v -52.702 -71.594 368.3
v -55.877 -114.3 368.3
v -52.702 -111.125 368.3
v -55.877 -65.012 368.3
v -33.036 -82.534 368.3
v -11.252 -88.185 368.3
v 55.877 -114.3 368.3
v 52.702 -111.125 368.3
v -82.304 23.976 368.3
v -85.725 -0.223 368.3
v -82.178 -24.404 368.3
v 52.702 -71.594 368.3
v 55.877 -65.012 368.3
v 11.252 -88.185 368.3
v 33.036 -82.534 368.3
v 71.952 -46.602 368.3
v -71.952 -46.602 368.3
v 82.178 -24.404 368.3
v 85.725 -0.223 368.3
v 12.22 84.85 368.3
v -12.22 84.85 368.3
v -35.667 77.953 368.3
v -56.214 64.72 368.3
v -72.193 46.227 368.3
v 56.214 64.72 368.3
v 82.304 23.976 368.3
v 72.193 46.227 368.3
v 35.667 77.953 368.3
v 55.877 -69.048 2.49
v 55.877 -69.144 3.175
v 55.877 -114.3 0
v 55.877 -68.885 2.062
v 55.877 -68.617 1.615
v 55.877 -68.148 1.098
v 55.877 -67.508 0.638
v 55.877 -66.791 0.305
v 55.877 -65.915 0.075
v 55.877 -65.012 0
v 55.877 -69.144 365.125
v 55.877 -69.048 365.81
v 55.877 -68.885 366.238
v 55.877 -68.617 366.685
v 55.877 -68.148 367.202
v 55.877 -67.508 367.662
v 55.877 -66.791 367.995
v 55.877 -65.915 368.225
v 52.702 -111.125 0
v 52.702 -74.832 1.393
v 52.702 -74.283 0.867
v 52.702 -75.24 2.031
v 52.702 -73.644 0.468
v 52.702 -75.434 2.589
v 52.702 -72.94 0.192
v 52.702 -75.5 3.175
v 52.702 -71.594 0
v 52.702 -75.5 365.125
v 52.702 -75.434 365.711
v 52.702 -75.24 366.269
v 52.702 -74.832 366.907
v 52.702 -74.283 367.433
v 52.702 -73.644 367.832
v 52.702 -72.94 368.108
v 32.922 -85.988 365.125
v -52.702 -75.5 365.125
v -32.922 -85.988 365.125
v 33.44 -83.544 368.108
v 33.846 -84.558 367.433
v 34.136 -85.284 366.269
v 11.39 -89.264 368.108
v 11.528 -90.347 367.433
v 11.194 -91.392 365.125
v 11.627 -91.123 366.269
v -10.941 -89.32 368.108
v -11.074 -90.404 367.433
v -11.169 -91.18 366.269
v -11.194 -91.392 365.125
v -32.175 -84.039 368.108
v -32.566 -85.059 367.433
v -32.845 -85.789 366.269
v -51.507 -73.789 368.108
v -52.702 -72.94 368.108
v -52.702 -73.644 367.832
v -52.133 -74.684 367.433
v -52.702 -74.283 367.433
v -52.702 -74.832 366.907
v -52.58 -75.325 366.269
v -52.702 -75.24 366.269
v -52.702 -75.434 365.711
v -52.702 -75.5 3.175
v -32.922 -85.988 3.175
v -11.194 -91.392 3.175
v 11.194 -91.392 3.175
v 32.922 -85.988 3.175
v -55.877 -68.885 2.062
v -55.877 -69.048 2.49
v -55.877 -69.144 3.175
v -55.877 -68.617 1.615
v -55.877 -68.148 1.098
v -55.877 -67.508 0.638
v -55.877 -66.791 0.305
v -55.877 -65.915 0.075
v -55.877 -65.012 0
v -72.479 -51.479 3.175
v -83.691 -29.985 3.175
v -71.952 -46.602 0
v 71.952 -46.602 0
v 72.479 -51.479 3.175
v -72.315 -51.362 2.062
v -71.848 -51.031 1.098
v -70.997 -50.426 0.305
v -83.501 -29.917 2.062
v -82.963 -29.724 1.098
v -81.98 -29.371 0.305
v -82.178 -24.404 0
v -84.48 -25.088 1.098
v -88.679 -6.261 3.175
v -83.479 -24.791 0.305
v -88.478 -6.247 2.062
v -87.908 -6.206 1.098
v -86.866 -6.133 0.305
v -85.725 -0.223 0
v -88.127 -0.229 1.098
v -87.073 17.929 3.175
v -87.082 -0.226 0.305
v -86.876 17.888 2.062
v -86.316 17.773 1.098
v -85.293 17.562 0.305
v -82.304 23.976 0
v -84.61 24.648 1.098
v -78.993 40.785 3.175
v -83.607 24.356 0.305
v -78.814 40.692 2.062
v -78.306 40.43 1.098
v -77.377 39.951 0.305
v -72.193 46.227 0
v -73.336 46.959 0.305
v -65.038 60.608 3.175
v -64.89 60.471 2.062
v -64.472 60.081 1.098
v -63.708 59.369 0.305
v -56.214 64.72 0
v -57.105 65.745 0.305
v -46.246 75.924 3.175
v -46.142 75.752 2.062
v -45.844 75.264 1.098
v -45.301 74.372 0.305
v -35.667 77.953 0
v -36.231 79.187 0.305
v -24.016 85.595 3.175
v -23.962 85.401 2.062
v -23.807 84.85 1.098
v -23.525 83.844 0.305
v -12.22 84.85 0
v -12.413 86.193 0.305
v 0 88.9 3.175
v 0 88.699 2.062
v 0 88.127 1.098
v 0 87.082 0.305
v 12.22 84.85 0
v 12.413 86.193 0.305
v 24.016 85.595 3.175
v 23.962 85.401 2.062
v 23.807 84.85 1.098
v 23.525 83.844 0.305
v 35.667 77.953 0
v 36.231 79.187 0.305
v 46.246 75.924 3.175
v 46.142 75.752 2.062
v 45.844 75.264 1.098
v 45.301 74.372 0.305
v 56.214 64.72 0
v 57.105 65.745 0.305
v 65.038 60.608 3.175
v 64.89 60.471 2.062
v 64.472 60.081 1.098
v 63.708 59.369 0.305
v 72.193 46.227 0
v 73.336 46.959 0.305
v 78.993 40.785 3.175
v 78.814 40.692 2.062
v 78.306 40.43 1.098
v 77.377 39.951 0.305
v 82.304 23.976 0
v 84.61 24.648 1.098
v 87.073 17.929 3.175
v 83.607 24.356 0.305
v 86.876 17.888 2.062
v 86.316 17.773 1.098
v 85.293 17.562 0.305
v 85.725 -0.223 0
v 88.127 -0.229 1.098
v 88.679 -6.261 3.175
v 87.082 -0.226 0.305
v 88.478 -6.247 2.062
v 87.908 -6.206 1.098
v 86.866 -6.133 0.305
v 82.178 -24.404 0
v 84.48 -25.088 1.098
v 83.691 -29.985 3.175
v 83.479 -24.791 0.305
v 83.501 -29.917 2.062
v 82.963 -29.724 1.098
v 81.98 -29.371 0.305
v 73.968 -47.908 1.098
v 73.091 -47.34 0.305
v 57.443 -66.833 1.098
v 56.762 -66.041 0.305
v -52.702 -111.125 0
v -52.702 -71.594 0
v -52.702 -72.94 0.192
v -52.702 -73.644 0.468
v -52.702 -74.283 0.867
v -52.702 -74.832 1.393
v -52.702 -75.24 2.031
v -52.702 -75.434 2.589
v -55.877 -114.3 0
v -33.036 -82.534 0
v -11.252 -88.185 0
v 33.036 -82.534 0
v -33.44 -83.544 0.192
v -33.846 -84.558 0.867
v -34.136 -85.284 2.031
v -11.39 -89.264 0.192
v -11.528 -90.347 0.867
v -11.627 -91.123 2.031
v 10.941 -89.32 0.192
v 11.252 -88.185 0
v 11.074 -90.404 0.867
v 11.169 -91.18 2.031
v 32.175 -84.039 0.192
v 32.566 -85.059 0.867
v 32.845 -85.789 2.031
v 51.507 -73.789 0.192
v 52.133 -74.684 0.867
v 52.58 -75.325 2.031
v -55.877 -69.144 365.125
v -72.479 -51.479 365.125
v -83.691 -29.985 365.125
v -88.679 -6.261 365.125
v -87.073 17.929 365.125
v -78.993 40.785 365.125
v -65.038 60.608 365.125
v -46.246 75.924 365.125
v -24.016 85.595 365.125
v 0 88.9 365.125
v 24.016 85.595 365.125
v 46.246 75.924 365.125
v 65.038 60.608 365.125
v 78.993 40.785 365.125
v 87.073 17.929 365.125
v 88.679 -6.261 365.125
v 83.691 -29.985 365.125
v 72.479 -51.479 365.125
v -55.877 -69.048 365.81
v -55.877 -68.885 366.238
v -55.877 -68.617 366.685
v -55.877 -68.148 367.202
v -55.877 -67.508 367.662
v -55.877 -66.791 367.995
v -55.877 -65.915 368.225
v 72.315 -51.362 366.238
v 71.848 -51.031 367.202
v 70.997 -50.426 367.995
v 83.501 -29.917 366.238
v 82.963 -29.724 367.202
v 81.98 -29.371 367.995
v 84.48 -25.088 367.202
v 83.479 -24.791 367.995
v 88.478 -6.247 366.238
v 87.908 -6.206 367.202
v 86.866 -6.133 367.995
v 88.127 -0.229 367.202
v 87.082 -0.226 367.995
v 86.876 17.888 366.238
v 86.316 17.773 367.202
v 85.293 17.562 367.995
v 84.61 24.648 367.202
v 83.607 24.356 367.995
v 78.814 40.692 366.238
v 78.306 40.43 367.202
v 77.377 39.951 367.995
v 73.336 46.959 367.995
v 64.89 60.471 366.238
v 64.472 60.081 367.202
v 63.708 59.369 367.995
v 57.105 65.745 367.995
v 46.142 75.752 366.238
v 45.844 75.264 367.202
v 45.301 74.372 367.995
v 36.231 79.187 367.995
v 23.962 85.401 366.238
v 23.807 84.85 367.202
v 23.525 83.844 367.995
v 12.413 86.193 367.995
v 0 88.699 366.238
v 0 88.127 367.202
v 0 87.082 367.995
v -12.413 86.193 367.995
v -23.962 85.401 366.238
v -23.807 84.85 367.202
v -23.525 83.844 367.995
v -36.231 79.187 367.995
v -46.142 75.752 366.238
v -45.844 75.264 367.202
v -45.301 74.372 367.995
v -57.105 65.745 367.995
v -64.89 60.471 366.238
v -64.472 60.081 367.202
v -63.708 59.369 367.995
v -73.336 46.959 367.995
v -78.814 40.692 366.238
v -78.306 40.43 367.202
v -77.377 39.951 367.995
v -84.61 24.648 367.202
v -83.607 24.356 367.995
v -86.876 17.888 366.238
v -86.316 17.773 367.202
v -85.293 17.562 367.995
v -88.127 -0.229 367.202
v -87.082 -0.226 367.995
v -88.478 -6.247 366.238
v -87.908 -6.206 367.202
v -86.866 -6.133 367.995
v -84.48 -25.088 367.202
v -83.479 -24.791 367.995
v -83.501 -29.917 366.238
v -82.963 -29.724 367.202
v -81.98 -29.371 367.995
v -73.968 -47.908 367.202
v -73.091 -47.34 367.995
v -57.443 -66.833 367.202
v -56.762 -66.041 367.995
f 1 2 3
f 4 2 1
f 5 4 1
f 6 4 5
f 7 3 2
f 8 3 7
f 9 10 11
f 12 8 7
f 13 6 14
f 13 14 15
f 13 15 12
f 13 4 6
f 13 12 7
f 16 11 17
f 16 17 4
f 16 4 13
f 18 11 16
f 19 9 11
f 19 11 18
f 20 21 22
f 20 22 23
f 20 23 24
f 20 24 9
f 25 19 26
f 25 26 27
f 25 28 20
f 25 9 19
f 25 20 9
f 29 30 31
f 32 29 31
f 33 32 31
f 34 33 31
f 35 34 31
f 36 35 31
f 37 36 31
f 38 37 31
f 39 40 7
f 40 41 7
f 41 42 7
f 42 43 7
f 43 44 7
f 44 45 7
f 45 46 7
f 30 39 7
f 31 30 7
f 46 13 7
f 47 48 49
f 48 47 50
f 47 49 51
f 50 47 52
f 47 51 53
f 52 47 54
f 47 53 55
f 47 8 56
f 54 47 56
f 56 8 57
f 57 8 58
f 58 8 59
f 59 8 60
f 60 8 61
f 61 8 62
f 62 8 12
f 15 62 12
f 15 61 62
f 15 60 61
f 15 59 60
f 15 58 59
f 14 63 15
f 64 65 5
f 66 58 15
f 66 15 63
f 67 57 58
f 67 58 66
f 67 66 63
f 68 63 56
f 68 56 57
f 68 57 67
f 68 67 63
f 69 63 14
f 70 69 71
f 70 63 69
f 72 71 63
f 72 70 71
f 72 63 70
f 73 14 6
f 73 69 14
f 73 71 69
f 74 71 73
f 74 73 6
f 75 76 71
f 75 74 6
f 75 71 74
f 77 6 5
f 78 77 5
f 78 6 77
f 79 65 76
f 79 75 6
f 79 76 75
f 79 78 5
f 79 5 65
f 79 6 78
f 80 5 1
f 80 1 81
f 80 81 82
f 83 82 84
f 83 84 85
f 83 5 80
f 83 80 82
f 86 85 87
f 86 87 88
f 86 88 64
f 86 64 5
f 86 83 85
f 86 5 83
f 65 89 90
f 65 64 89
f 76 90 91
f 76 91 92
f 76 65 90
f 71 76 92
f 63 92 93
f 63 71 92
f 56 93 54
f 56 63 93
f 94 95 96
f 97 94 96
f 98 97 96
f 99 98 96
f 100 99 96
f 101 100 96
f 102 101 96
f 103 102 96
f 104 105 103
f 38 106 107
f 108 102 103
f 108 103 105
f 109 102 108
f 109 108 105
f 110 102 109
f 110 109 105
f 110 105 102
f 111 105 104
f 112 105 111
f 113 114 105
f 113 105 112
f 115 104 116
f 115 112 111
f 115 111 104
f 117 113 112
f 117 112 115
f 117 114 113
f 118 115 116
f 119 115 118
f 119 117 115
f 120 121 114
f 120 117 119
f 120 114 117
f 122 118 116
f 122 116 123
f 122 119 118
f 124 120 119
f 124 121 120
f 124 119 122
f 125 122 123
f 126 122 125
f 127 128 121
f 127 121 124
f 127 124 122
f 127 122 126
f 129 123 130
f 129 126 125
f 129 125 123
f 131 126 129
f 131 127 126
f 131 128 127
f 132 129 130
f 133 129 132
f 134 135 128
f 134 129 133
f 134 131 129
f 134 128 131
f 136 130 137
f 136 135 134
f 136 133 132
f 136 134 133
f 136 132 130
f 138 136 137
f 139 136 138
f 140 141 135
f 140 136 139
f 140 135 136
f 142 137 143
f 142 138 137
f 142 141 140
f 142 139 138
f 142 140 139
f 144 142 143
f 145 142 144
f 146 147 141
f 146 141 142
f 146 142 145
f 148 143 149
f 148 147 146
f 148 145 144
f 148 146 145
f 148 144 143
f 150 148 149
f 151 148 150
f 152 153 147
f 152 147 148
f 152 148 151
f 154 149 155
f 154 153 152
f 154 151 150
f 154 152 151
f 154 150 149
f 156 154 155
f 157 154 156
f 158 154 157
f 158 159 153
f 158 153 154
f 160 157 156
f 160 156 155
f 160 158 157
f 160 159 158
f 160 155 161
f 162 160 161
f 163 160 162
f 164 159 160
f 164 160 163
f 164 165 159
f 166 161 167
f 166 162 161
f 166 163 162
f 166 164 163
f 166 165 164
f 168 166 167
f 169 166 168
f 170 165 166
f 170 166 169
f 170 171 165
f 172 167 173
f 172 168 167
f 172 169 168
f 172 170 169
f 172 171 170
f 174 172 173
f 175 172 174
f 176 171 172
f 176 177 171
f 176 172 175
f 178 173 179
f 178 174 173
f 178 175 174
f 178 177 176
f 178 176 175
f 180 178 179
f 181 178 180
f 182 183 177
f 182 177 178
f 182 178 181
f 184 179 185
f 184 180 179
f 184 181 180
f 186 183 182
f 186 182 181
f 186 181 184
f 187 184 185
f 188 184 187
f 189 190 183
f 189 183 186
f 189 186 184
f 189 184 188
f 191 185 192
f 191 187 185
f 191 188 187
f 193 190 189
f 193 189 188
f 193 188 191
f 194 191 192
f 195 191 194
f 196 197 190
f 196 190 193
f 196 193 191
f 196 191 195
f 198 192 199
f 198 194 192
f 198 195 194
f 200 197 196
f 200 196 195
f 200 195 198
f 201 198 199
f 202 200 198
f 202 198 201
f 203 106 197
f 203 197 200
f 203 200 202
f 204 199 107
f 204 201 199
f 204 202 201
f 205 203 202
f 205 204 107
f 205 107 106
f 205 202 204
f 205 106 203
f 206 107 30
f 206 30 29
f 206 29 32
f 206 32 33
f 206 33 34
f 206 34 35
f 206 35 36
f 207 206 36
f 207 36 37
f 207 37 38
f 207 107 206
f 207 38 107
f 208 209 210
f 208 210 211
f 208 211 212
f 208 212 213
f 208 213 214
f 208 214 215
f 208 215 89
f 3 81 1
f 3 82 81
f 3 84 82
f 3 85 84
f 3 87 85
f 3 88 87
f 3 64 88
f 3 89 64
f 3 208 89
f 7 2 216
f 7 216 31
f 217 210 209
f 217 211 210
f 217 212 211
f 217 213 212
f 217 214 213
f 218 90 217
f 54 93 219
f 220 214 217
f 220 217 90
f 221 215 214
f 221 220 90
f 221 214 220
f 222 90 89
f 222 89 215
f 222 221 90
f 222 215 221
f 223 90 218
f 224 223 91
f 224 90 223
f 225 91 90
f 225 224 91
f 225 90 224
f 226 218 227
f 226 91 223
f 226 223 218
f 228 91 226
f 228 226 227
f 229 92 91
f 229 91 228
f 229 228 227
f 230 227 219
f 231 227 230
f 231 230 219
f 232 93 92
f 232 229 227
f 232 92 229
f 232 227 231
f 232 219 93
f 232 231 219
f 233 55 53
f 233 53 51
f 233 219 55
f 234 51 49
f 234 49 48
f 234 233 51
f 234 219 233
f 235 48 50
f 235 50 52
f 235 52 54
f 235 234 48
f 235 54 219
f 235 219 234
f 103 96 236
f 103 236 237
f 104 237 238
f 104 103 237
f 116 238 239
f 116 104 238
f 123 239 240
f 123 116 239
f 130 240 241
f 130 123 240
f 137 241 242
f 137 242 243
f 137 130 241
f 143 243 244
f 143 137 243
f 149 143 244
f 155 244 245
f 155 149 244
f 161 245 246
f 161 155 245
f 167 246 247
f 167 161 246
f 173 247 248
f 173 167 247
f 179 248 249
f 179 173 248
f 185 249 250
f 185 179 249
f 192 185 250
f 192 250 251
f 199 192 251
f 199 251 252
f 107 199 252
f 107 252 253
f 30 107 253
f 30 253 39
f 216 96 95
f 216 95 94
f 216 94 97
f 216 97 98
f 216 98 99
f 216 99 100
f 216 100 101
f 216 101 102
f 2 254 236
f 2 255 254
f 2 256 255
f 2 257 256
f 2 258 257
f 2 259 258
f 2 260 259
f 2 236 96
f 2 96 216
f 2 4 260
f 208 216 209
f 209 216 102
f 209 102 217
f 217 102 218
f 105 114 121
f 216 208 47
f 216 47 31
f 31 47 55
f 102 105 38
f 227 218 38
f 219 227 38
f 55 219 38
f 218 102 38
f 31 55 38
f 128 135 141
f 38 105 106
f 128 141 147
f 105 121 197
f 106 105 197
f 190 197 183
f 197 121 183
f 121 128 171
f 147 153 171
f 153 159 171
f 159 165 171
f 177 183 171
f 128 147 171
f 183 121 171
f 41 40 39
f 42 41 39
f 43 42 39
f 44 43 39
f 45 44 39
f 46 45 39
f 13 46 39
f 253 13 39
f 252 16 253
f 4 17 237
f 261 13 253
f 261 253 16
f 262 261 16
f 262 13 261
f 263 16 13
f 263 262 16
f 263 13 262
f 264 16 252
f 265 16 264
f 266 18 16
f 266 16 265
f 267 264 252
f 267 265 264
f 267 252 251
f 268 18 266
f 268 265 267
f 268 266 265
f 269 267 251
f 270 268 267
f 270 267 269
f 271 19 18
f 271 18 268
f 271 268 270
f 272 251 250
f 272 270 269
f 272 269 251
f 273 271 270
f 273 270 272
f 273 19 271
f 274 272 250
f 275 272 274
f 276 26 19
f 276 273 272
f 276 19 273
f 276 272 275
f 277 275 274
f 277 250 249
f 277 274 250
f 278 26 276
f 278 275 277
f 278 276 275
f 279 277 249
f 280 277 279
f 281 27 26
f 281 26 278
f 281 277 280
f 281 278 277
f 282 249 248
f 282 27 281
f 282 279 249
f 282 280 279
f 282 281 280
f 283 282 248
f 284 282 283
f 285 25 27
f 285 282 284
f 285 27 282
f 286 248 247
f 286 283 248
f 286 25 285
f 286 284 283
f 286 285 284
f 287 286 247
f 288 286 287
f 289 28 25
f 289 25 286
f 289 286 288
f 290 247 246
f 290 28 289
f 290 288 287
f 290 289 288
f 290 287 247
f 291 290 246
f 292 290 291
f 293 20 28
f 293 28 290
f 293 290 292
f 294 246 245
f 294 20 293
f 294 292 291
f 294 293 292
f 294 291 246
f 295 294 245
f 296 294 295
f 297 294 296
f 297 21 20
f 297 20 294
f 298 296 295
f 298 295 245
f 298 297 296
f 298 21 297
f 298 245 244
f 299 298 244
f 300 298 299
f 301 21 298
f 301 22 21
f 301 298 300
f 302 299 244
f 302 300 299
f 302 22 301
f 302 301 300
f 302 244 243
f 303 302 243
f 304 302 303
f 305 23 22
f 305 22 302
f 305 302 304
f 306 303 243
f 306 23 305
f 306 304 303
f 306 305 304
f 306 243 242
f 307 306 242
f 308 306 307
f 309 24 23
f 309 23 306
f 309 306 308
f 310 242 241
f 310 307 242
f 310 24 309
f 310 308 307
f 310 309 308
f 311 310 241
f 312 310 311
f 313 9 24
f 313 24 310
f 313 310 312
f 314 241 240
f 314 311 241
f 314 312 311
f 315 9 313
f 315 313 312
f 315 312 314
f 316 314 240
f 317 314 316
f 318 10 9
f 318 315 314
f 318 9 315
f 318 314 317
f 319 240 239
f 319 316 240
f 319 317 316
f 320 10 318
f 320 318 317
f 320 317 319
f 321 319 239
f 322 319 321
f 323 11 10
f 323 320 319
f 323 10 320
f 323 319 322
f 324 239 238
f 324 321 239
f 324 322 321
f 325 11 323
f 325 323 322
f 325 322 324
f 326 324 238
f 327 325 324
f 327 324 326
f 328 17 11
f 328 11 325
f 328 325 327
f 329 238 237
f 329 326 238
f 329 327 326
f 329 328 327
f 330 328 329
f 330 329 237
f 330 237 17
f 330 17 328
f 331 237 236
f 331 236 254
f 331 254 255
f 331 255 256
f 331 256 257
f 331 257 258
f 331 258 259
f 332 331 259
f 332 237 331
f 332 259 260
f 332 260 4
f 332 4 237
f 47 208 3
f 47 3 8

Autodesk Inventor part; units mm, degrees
ref_plane "YZ Plane" through (0, 0, 0) normal (1, 0, 0) x (0, 1, 0)
ref_plane "XZ Plane" through (0, 0, 0) normal (0, 1, 0) x (-1, 0, 0)
ref_plane "XY Plane" through (0, 0, 0) normal (0, 0, 1) x (1, 0, 0)
sketch "Sketch6" plane through (0, 0, 0) normal (0, 0, 1) x (1, 0, 0)
  circle A0 centre (0, 0) radius 88.9
  dimension "d25" = 177.8
extrude "Extrusion6" add sketch "Sketch6" along normal blind 368.3
sketch "Sketch7" plane through (0, 0, 368.3) normal (0, 0, 1) x (1, 0, 0)
  circle A0 centre (0, 0) radius 88.9 projected
  line L0 (55.8771, -69.1444) -> (55.8771, -114.3)
  line L1 (-55.8771, -69.1444) -> (-55.8771, -114.3)
  line L2 (-55.8771, -114.3) -> (55.8771, -114.3)
  arc A1 (-55.8771, -69.1444) -> (55.8771, -69.1444) centre (0, 0) ccw
  line L3 (52.7021, -111.125) -> (52.7021, -75.5003)
  arc A2 (-52.7021, -75.5003) -> (52.7021, -75.5003) centre (0, 0) ccw
  line L4 (-52.7021, -75.5003) -> (-52.7021, -111.125)
  line L5 (-52.7021, -111.125) -> (52.7021, -111.125)
  dimension "d29" = 3.175
extrude "Extrusion7" add sketch "Sketch7" against normal blind 368.3 contours A0 L0 L2 L1
fillet "Fillet1" radius 3.175 4 edges at (0, 88.9, 368.3) (0, 88.9, 0) (0, -92.075, 368.3) (0, -92.075, 0)
properties part number "Tank"
